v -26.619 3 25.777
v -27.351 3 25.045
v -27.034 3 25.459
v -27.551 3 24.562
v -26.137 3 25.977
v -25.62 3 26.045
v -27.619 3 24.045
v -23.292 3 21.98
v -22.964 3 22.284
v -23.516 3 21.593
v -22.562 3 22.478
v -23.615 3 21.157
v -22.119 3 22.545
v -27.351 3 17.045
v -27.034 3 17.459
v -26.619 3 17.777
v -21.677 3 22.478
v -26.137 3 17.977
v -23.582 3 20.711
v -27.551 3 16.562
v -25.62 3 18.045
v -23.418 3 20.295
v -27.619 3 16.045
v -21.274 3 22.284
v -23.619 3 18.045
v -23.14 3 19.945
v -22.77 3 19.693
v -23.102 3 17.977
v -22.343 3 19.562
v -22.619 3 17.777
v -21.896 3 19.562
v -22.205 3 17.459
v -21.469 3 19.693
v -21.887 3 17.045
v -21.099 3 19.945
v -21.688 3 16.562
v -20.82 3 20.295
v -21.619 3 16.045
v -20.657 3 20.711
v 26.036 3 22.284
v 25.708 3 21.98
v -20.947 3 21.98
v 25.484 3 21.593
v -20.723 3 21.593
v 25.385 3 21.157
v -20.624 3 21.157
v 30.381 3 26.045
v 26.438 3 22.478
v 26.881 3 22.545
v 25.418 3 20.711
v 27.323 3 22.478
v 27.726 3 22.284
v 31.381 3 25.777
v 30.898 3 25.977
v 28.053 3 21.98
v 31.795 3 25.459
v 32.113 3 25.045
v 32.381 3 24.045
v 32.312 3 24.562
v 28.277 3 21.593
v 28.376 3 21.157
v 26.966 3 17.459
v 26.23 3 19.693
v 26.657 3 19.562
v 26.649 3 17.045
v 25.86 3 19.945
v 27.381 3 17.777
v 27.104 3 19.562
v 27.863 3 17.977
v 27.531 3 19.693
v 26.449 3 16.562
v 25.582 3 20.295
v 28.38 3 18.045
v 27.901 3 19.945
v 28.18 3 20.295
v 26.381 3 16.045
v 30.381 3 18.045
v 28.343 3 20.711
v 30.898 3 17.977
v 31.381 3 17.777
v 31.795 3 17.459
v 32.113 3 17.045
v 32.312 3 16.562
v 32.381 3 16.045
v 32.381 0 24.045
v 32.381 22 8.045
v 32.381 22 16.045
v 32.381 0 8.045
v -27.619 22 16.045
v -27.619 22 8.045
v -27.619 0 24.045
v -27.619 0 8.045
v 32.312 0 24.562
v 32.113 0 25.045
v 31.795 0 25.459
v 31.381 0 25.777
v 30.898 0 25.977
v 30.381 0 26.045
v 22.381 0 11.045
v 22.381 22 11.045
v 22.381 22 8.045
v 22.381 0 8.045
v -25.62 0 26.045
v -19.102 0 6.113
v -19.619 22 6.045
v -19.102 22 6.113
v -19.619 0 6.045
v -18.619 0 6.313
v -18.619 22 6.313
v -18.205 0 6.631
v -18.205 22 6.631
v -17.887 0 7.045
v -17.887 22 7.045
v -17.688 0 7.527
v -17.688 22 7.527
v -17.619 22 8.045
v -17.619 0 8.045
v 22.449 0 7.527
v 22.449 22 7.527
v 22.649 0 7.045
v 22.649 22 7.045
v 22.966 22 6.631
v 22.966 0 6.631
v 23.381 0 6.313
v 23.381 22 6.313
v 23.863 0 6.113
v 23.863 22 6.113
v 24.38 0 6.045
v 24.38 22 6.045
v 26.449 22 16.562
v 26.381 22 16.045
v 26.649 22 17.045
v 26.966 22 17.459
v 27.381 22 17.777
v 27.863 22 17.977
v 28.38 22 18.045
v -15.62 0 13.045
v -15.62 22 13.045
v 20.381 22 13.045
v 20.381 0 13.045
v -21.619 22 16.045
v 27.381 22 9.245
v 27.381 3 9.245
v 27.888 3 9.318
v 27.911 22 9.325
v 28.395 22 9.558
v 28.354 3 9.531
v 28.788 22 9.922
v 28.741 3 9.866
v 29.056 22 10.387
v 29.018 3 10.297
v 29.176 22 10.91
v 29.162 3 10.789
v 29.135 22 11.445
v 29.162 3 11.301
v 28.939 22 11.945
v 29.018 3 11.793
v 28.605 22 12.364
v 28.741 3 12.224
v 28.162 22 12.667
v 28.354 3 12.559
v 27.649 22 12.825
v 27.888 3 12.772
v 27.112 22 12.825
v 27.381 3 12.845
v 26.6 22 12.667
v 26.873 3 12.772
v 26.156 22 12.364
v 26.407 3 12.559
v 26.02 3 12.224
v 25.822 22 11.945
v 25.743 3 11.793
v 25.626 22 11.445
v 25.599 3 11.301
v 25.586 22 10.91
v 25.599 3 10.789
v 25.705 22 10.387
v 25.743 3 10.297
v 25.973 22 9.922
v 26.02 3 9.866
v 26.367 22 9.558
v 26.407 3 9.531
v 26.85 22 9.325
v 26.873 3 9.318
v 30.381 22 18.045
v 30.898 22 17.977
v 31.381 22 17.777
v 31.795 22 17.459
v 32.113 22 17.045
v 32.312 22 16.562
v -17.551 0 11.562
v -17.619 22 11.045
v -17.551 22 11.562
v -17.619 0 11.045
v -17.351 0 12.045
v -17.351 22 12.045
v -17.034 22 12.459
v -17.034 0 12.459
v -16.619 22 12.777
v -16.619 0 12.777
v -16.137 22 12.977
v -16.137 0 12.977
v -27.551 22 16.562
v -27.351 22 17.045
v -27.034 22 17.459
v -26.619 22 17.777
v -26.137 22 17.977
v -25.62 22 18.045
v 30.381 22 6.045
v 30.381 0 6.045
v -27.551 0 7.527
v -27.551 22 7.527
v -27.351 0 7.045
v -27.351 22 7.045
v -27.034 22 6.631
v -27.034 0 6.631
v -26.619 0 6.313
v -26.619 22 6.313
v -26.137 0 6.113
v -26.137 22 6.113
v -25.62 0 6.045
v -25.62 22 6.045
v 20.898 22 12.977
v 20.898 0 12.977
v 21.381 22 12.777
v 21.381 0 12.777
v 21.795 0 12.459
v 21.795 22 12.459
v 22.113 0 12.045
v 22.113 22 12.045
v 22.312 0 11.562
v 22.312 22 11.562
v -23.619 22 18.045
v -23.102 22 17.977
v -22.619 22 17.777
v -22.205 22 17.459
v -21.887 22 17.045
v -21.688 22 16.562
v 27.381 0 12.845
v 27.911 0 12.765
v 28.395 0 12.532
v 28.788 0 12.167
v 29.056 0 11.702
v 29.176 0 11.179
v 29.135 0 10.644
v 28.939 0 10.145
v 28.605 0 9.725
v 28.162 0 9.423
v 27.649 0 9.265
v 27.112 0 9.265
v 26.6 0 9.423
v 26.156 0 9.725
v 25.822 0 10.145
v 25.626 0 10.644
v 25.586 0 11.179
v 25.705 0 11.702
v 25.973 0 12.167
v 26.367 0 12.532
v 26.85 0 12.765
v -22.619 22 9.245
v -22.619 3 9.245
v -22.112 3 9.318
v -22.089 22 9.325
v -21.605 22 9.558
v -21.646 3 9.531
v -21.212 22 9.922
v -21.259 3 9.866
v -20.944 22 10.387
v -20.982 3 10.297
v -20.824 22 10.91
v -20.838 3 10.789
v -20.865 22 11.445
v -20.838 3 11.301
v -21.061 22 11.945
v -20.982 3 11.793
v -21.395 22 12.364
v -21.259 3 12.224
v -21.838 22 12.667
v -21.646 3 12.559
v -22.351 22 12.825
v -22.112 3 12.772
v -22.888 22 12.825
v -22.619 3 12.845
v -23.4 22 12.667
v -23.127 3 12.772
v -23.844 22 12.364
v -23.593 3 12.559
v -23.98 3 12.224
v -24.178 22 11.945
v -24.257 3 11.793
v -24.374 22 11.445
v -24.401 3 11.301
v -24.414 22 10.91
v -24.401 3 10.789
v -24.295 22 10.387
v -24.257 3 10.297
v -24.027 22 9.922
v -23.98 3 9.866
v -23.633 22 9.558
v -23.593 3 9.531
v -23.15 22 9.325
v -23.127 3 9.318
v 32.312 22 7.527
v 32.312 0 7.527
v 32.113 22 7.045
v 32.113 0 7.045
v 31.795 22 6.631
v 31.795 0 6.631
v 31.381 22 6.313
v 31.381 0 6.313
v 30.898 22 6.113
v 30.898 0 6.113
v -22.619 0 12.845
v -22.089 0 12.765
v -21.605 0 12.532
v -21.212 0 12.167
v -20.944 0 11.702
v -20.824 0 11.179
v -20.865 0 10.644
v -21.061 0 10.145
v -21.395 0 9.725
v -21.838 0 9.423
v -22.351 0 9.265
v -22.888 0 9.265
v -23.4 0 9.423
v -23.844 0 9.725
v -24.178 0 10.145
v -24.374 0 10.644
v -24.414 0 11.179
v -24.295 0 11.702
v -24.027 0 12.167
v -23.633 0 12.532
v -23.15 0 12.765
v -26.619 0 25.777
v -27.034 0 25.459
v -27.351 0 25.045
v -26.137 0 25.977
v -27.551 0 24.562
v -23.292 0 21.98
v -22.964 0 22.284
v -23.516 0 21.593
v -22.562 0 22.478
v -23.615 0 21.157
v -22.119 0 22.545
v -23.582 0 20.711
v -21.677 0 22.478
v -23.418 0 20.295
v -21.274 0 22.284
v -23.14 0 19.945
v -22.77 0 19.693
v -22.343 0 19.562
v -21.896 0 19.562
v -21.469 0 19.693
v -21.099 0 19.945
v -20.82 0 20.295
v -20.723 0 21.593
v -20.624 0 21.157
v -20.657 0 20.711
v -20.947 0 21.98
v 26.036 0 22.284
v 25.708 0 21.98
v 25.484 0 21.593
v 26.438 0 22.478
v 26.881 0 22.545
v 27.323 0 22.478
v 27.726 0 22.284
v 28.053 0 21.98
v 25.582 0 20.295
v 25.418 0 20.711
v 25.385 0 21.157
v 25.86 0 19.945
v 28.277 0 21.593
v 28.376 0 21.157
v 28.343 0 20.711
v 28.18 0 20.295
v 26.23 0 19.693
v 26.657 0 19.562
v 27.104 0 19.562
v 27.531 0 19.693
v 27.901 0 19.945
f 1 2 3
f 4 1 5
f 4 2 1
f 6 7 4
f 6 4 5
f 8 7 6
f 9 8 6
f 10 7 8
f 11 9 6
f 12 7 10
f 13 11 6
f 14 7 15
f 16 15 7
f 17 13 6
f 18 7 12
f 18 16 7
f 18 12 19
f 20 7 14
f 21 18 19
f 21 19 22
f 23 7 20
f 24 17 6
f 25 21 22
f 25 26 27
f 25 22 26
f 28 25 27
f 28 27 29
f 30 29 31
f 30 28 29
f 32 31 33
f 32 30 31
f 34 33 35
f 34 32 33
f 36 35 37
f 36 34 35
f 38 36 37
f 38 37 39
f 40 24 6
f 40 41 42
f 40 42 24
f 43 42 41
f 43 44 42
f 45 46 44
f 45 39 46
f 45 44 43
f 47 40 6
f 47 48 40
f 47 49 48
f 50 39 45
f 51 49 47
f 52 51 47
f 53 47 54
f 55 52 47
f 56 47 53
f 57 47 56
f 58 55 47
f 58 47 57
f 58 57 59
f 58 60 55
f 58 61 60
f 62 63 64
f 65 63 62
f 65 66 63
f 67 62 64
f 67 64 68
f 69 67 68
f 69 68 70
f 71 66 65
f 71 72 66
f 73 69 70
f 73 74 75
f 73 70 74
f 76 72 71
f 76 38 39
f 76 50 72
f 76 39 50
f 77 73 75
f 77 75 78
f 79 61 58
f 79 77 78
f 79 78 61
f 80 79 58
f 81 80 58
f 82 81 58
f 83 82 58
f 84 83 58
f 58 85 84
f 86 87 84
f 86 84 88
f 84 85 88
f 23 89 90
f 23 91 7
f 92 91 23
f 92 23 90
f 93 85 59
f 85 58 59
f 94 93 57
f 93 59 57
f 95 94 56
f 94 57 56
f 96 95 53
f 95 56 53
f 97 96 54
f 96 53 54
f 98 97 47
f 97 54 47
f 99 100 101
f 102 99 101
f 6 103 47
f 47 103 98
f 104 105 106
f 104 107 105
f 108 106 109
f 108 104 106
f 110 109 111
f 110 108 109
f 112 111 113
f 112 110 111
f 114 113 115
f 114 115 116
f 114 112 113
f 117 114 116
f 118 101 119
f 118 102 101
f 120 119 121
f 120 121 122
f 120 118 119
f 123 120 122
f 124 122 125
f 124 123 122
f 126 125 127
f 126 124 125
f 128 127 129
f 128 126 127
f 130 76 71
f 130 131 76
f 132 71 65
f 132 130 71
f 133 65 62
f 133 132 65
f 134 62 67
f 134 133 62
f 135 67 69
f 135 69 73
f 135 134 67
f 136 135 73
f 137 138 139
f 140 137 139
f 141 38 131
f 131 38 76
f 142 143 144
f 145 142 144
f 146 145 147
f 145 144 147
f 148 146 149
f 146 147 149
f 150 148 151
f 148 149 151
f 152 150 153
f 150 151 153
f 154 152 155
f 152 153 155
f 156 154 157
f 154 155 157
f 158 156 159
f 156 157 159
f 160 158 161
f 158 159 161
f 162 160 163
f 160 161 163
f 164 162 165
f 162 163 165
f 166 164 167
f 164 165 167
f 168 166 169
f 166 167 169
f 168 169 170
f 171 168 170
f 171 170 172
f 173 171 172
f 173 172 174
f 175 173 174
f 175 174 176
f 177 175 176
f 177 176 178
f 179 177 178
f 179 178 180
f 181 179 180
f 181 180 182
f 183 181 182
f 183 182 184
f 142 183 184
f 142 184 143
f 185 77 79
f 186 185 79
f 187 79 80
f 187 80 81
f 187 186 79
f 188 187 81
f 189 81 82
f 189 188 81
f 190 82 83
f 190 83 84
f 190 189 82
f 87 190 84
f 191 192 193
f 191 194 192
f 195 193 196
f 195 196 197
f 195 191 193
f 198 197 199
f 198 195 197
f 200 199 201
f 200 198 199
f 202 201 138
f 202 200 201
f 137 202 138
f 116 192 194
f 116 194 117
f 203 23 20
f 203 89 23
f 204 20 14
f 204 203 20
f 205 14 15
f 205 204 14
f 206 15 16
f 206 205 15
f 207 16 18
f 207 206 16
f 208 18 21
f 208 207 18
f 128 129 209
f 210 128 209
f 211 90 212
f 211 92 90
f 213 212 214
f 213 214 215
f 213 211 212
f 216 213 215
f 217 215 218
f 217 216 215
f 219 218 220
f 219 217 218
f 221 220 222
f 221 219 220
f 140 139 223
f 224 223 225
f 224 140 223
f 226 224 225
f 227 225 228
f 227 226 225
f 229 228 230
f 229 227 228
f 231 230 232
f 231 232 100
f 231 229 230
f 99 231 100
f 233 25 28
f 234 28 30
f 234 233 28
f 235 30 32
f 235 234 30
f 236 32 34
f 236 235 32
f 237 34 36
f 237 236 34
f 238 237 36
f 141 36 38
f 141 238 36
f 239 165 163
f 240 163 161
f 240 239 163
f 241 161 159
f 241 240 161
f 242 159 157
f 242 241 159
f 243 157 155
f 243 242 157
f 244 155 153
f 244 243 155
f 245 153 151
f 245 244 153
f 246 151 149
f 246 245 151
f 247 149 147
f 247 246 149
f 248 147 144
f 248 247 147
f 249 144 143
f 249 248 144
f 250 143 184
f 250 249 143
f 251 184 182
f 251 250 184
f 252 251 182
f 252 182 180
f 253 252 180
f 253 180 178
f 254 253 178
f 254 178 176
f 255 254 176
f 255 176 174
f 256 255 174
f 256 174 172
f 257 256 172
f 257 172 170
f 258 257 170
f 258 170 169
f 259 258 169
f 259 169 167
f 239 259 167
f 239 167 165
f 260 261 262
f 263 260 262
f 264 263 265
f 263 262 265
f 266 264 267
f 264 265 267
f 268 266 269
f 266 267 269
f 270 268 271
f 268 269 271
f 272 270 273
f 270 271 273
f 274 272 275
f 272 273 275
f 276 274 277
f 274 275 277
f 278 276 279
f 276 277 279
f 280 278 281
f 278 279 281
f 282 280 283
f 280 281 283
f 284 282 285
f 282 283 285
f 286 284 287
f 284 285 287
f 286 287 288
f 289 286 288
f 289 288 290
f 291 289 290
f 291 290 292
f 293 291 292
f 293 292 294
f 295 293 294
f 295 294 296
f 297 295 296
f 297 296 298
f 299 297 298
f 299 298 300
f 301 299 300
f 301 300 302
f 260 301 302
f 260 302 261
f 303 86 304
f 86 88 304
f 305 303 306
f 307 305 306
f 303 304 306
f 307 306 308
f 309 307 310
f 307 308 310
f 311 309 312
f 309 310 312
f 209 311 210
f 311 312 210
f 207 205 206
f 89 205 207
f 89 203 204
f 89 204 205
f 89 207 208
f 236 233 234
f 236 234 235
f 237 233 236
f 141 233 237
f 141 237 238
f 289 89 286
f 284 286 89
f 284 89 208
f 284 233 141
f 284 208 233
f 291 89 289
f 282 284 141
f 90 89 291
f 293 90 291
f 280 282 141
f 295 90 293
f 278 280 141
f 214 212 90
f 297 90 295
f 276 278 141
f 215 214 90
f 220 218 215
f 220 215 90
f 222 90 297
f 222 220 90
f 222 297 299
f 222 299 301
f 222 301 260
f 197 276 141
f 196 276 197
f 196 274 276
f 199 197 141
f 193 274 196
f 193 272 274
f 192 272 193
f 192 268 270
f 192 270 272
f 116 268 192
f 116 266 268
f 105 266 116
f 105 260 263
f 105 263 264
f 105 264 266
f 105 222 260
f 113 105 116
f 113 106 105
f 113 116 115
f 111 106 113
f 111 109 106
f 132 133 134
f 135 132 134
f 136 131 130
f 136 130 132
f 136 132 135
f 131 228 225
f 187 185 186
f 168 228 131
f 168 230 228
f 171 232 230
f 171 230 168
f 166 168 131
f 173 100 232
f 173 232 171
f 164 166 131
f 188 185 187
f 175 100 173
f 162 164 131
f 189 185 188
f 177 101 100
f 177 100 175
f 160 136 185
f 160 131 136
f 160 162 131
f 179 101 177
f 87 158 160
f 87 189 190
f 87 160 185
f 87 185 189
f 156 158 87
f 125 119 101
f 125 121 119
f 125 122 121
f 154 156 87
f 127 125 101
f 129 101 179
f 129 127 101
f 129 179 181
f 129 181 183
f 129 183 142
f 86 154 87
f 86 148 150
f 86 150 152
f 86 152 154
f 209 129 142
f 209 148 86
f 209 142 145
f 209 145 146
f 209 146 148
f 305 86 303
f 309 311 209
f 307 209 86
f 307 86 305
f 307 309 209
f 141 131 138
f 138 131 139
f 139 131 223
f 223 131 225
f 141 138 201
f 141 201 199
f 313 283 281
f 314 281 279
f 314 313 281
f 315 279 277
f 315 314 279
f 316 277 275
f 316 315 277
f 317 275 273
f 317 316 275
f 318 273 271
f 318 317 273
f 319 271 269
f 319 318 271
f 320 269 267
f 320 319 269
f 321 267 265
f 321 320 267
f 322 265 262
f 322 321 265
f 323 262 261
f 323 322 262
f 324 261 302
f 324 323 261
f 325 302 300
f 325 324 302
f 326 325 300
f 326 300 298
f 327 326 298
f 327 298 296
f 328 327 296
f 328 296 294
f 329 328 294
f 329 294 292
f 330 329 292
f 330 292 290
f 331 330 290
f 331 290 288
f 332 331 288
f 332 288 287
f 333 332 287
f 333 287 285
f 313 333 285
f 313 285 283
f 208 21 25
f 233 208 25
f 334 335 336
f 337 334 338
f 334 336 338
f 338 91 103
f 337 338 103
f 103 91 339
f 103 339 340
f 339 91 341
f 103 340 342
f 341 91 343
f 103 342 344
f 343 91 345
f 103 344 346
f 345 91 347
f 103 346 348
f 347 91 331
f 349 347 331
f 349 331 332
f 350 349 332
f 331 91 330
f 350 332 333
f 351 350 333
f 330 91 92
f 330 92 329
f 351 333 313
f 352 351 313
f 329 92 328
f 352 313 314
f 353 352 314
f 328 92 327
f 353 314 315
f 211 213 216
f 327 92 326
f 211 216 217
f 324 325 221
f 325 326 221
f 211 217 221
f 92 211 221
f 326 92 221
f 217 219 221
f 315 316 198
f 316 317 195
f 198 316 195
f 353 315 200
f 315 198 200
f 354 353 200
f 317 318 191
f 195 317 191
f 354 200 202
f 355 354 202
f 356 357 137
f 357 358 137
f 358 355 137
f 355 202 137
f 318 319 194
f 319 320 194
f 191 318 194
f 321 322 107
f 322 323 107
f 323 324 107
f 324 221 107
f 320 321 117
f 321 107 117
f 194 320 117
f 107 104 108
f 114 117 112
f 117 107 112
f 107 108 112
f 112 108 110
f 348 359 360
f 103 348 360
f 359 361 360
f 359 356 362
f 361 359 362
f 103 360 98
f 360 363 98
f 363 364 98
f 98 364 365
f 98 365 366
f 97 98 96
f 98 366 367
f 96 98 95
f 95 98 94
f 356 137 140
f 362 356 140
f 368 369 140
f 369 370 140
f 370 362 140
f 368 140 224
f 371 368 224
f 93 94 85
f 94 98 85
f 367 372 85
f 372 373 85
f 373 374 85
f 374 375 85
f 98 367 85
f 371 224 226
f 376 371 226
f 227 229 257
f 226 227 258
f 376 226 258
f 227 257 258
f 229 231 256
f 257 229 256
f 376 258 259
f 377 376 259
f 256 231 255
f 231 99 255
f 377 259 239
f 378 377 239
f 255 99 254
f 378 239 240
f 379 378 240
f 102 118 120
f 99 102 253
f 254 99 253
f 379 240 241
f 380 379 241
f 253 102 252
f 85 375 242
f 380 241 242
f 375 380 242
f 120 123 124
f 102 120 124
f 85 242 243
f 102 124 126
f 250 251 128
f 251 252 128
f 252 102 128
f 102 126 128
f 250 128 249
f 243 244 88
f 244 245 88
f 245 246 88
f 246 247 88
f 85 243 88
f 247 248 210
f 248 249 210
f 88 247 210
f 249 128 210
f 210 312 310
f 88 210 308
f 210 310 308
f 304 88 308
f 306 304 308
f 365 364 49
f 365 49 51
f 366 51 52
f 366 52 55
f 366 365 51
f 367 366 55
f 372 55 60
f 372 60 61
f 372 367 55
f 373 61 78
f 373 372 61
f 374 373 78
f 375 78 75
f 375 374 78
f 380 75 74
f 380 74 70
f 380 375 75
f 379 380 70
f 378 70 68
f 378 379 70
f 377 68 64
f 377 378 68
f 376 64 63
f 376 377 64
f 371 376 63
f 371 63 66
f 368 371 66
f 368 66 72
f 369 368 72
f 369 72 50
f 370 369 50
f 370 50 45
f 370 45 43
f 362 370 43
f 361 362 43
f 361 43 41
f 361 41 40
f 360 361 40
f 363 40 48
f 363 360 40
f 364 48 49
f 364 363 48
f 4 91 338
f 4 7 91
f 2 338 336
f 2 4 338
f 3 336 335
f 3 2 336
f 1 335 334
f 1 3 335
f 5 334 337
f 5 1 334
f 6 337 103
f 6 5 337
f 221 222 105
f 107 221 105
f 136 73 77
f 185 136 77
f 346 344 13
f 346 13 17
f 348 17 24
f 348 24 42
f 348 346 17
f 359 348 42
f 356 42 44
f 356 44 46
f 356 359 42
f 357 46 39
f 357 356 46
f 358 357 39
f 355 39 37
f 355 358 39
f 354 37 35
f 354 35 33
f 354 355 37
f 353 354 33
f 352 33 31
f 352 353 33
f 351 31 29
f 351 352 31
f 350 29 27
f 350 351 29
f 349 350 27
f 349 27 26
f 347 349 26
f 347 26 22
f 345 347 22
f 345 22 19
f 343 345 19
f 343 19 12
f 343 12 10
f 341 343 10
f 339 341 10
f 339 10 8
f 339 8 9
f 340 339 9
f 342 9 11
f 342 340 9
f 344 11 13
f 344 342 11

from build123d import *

# Parameters (mm, degrees)
SKETCH_1_W          = 60
SKETCH_1_H          = 20
SKETCH_1_R          = 1.5
SKETCH_1_R_2        = 1.8
EXTRUDE_1_DEPTH     = 3
SKETCH_7_W          = 60
SKETCH_7_H          = 10
EXTRUDE_3_DEPTH     = 19
SKETCH_8_R          = 1.8
CUT_EXTRUDE_3_DEPTH = 46.692815914
SKETCH_9_W          = 6
SKETCH_9_H          = 19
EXTRUDE_4_DEPTH     = 2
SKETCH_10_W         = 40
SKETCH_10_H         = 7
CUT_EXTRUDE_4_DEPTH = 48.019500488
FILLET_2_R          = 2


with BuildPart() as part:
    # ｽｹｯﾁ1 → ﾎﾞｽ - 押し出し1 (new body)
    with BuildSketch(Plane(origin=(0, 0, 0), x_dir=(1, 0, 0), z_dir=(0, 1, 0))):
        with Locations((2.380597015, -16.044776119)):
            Rectangle(SKETCH_1_W, SKETCH_1_H)
        with Locations(Location((-22.119402985, -21.044776119, 0), (0, 0, 270))):
            Circle(SKETCH_1_R, mode=Mode.SUBTRACT)
        with Locations(Location((26.880597015, -21.044776119, 0), (0, 0, 270))):
            Circle(SKETCH_1_R, mode=Mode.SUBTRACT)
        with Locations(Location((-22.619402985, -11.044776119, 0), (0, 0, 270))):
            Circle(SKETCH_1_R_2, mode=Mode.SUBTRACT)
        with Locations(Location((27.380597015, -11.044776119, 0), (0, 0, 270))):
            Circle(SKETCH_1_R_2, mode=Mode.SUBTRACT)
    extrude(amount=EXTRUDE_1_DEPTH)

    # ｽｹｯﾁ7 → ﾎﾞｽ - 押し出し3 (add)
    with BuildSketch(Plane(origin=(0, 3, 0), x_dir=(1, 0, 0), z_dir=(0, 1, 0))):
        with Locations((2.380597015, -11.044776119)):
            Rectangle(SKETCH_7_W, SKETCH_7_H)
    extrude(amount=EXTRUDE_3_DEPTH)

    # ｽｹｯﾁ8 → ｶｯﾄ - 押し出し3 (cut, through all)
    with BuildSketch(Plane.XZ.offset(-3)):
        with Locations(Location((27.380597015, 11.044776119, 0), (0, 0, 270))):
            Circle(SKETCH_8_R)
        with Locations(Location((-22.619402985, 11.044776119, 0), (0, 0, 270))):
            Circle(SKETCH_8_R)
    extrude(amount=-CUT_EXTRUDE_3_DEPTH, mode=Mode.SUBTRACT)

    # ｽｹｯﾁ9 → ﾎﾞｽ - 押し出し4 (add)
    with BuildSketch(Plane.XY.offset(16.044776119)):
        with Locations((29.380597015, 12.5)):
            Rectangle(SKETCH_9_W, SKETCH_9_H)
        with Locations((-24.619402985, 12.5)):
            Rectangle(SKETCH_9_W, SKETCH_9_H)
    extrude(amount=EXTRUDE_4_DEPTH)

    # ｽｹｯﾁ10 → ｶｯﾄ - 押し出し4 (cut, through all)
    with BuildSketch(Plane(origin=(0, 22, 0), x_dir=(1, 0, 0), z_dir=(0, 1, 0))):
        with Locations((2.380597015, -9.544776119)):
            Rectangle(SKETCH_10_W, SKETCH_10_H)
    extrude(amount=-CUT_EXTRUDE_4_DEPTH, mode=Mode.SUBTRACT)

    # ﾌｨﾚｯﾄ2
    fillet_2_edges = [part.edges().sort_by_distance(p)[0] for p in [
        (32.380597015, 12.5, 18.044776119),
        (26.380597015, 12.5, 18.044776119),
        (-27.619402985, 12.5, 18.044776119),
        (-21.619402985, 12.5, 18.044776119),
        (32.380597015, 1.5, 26.044776119),
        (-27.619402985, 1.5, 26.044776119),
        (-27.619402985, 11, 6.044776119),
        (32.380597015, 11, 6.044776119),
        (22.380597015, 11, 6.044776119),
        (22.380597015, 11, 13.044776119),
        (-17.619402985, 11, 13.044776119),
        (-17.619402985, 11, 6.044776119),
    ]]
    fillet(fillet_2_edges, radius=FILLET_2_R - 0.0001)  # a hair under: the kernel refuses the full size


solid = part.part
